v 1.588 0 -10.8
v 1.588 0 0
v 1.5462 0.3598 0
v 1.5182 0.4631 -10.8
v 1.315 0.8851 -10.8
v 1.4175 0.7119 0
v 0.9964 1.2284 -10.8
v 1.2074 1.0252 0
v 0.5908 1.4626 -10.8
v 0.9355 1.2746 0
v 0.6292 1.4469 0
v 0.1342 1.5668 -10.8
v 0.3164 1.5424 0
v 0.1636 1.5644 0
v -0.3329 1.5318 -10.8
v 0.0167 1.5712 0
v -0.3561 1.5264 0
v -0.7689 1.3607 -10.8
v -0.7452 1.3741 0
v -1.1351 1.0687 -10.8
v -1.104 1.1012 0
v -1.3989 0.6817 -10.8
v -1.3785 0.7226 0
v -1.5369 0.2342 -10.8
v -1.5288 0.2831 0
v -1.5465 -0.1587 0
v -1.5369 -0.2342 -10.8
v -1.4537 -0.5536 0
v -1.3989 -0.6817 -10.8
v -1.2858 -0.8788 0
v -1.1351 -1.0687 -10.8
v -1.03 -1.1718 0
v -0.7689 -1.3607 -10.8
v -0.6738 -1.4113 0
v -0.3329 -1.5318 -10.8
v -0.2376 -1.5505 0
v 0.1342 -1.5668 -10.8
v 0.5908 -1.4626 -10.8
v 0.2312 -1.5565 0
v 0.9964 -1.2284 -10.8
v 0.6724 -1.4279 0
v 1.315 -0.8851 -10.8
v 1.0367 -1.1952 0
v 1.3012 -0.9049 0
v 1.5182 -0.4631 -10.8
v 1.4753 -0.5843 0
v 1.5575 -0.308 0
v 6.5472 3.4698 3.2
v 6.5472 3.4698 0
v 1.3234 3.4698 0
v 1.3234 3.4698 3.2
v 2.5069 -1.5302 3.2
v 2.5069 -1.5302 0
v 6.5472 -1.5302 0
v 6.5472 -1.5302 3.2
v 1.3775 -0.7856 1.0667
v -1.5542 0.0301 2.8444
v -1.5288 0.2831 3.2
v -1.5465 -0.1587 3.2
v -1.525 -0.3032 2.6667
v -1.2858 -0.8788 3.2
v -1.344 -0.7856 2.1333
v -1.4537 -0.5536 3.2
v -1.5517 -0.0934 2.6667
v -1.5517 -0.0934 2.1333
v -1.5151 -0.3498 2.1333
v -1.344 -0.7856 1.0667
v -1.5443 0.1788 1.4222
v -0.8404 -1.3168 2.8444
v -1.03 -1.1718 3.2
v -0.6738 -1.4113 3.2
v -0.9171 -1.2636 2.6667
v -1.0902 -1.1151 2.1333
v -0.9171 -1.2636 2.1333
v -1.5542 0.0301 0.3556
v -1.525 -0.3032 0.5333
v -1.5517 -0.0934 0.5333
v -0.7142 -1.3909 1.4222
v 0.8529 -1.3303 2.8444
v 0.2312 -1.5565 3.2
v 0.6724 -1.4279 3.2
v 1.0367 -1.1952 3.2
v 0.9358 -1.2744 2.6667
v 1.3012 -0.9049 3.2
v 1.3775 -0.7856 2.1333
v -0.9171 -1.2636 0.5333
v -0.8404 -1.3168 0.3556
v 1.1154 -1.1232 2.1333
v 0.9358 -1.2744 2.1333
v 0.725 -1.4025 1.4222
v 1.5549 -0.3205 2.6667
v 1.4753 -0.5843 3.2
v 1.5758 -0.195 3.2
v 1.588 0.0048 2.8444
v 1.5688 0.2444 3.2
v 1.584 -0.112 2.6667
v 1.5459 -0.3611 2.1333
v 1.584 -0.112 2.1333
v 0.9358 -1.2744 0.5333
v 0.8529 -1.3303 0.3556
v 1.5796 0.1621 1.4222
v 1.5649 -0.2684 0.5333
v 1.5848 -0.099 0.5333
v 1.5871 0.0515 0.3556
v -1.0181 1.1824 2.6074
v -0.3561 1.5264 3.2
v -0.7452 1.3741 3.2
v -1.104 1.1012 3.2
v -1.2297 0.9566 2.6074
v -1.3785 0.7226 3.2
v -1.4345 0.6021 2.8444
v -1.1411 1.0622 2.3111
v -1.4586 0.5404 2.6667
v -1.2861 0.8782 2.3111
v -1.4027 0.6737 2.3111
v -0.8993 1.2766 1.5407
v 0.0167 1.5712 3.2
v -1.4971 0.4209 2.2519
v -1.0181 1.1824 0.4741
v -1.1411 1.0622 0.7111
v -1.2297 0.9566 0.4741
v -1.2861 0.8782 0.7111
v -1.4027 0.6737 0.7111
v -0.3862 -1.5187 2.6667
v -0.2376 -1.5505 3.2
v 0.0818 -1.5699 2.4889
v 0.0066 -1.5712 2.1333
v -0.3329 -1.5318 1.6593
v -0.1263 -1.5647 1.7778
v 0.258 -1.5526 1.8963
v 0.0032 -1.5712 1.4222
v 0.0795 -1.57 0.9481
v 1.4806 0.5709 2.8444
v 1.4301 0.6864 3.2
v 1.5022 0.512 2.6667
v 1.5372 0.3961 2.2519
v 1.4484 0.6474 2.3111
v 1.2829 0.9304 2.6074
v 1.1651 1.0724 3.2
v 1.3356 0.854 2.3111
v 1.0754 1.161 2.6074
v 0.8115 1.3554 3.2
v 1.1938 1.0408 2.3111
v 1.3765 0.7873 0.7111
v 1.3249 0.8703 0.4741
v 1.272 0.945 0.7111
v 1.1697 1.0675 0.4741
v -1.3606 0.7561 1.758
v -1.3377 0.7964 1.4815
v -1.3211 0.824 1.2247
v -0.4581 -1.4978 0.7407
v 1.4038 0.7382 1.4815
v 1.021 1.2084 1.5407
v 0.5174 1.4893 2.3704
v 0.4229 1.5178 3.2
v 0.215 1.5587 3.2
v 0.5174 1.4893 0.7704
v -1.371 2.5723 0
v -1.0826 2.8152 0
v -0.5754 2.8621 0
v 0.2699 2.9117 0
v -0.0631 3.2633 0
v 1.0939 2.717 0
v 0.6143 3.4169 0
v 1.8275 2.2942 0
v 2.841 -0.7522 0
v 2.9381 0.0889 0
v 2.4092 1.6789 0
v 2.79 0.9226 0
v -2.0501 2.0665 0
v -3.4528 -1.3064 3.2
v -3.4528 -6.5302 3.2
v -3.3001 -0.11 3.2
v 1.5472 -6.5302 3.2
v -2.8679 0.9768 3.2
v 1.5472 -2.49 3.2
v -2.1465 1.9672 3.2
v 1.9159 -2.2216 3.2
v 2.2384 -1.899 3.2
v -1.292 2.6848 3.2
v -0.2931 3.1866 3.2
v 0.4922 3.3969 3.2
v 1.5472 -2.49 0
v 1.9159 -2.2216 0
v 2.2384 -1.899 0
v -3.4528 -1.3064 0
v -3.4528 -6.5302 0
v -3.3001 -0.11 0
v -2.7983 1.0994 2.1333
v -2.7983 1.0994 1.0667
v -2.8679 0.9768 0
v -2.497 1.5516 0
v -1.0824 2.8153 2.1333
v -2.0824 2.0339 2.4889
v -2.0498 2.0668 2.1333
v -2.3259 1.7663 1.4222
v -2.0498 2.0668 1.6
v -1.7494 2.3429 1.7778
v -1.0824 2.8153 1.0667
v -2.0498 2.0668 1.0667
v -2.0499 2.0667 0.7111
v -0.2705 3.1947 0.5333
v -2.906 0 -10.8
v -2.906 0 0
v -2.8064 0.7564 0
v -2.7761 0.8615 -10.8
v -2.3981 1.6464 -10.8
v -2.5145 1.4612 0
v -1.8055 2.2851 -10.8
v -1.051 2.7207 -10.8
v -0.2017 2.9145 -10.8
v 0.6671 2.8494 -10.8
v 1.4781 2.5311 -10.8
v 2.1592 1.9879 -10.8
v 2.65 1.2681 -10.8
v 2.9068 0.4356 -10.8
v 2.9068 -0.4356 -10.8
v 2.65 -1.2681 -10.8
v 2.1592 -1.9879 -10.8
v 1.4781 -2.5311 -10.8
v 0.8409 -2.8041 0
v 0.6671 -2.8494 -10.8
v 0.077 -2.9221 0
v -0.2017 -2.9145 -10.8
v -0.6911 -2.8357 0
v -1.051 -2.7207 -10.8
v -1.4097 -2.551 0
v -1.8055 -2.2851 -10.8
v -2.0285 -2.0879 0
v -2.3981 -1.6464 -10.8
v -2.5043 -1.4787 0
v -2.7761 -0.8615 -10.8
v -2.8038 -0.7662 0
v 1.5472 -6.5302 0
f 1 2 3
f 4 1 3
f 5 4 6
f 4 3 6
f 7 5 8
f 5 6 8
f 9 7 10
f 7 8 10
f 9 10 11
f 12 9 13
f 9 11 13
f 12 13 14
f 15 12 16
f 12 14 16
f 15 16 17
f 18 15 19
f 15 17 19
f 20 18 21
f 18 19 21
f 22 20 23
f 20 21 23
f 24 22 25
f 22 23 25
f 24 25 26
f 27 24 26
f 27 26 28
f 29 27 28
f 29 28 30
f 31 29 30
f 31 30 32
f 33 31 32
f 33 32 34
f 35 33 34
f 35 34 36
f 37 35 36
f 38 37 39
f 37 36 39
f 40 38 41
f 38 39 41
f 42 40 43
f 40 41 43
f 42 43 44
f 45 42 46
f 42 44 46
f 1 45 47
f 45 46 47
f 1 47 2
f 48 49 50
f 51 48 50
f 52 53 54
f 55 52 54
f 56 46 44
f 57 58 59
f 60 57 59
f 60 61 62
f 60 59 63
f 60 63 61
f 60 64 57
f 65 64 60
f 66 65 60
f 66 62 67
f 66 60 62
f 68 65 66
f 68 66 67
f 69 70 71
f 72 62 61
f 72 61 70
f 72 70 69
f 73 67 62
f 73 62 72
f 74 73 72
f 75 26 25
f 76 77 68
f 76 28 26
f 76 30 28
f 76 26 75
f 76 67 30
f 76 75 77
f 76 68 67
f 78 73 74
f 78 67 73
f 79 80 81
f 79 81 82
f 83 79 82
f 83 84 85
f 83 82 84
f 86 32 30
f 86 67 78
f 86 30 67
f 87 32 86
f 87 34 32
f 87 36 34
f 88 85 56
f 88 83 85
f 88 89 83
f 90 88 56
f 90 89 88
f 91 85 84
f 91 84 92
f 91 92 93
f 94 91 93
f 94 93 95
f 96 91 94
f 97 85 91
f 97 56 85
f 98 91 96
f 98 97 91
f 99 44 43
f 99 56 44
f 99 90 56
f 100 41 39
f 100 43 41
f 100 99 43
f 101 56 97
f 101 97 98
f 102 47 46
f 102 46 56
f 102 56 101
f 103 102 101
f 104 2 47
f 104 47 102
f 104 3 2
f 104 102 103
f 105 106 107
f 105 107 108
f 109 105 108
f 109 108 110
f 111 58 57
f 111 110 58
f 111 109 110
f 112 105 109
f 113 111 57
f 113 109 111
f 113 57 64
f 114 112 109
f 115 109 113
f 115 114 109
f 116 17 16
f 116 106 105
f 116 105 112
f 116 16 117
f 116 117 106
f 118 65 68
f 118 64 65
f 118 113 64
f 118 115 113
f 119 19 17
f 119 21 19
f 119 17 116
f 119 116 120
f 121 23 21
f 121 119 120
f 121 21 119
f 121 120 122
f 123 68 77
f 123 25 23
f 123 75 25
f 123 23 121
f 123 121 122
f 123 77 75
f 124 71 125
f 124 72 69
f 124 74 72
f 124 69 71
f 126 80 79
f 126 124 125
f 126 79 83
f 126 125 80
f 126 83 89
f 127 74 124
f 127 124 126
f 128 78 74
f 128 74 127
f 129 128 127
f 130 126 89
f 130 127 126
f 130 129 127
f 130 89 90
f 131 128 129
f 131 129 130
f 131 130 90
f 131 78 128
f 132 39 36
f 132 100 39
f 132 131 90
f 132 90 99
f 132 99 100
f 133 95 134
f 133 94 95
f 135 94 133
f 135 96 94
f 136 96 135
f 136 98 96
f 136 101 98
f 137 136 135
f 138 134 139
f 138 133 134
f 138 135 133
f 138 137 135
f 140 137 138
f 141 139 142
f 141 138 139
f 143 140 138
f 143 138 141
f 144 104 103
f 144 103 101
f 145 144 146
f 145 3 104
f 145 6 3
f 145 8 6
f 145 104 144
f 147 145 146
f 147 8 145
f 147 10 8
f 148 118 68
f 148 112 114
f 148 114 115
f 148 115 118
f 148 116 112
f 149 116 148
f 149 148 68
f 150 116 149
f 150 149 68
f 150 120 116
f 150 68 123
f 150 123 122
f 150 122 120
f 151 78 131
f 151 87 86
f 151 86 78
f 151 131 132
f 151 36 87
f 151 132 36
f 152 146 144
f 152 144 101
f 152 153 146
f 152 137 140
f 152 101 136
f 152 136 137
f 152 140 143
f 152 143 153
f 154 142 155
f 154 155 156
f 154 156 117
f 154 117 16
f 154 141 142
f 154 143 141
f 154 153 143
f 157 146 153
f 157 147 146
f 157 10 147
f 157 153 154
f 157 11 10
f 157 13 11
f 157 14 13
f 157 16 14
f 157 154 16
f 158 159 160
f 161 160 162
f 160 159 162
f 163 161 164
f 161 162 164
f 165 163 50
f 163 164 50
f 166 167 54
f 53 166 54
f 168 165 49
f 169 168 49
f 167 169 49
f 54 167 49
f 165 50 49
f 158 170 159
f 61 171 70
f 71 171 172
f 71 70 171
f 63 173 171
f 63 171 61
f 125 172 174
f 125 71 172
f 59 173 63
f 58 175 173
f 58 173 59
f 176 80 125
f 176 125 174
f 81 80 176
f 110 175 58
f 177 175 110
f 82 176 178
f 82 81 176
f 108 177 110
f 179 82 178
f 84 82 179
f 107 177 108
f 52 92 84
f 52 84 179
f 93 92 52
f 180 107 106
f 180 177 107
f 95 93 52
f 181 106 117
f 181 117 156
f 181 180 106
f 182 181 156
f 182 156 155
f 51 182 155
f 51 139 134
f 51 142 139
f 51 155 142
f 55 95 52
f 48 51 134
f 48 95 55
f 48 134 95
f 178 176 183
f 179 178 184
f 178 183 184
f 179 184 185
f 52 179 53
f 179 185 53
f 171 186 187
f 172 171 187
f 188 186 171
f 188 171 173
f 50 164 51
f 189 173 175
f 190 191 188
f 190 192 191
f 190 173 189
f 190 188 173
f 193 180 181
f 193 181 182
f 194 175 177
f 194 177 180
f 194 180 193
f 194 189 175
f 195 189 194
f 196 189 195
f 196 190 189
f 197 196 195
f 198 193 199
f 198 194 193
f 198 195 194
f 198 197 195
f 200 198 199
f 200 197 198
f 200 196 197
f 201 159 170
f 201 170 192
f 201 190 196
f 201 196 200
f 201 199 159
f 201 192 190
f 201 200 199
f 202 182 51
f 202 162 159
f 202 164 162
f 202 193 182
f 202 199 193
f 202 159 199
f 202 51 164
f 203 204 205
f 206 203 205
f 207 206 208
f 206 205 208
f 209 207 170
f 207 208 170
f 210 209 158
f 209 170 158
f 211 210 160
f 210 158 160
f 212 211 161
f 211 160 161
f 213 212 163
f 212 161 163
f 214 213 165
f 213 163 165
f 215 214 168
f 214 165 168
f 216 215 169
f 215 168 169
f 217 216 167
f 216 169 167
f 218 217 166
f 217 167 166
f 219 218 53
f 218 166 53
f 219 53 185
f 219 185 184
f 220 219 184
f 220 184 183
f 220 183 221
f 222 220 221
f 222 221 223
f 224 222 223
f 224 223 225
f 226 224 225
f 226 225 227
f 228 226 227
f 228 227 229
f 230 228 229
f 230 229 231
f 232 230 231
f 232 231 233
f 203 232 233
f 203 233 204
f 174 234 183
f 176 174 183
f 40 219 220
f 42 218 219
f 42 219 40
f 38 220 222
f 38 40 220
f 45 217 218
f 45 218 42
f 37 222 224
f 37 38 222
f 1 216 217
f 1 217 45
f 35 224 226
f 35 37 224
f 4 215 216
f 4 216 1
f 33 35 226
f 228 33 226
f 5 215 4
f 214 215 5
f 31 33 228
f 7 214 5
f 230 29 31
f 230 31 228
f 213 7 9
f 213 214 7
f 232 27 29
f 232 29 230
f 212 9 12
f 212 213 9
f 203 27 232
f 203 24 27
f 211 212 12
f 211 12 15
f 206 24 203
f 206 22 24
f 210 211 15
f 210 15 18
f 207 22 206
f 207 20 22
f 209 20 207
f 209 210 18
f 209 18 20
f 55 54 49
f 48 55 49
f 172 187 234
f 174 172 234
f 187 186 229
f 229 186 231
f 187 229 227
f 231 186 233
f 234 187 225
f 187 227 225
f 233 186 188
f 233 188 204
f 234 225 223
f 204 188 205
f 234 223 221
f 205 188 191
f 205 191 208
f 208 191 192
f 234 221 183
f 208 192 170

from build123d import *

# Parameters (mm, degrees)
SALIENTE_EXTRUIR1_DEPTH = 3.2
CROQUIS2_R              = 2.9227085
SALIENTE_EXTRUIR2_DEPTH = 10.8
CROQUIS3_R              = 1.571228252
CORTAR_EXTRUIR1_DEPTH   = 13.8
CORTAR_EXTRUIR2_DEPTH   = 13.8


with BuildPart() as part:
    # Model → Saliente-Extruir1 (new body)
    with BuildSketch(Plane.XY):
        with BuildLine():
            Line((-3.452848132, -1.30644903), (-3.452848132, -6.530212538))
            Line((-3.452848132, -6.530212538), (6.547151868, -6.530212538))
            Line((6.547151868, -6.530212538), (6.547151868, 3.469787462))
            Line((6.547151868, 3.469787462), (1.32338836, 3.469787462))
            add(Edge.make_bspline(
                [(-3.452848132, -1.30644903), (-3.452848132, 1.32052565), (-1.303487189, 3.469787462), (1.32338836, 3.469787462)],
                knots=[0.777777778, 0.777777778, 0.777777778, 0.777777778, 1, 1, 1, 1], degree=3))
        make_face()
        with BuildLine():
            add(Edge.make_bspline(
                [(0.016741068, 1.571228252), (-2.704706095, 1.571228252), (-1.343982514, -0.785614126), (0.016741068, -3.142456504), (1.377464649, -0.785614126), (2.73818823, 1.571228252), (0.016741068, 1.571228252)],
                knots=[0, 0, 0, 2.094395102, 2.094395102, 4.188790205, 4.188790205, 6.283185307, 6.283185307, 6.283185307], degree=2, weights=[1, 0.5, 1, 0.5, 1, 0.5, 1]))
        make_face(mode=Mode.SUBTRACT)
    extrude(amount=SALIENTE_EXTRUIR1_DEPTH)

    # Croquis2 → Saliente-Extruir2 (add)
    with BuildSketch(Plane(origin=(0, 0, 0), x_dir=(-1, 0, 0), z_dir=(0, 0, -1))):
        with Locations((-0.016741068, 0)):
            Circle(CROQUIS2_R)
    extrude(amount=SALIENTE_EXTRUIR2_DEPTH)

    # Croquis3 → Cortar-Extruir1 (cut)
    with BuildSketch(Plane.XY):
        with Locations((0.016741068, 0)):
            Circle(CROQUIS3_R)
    extrude(amount=-CORTAR_EXTRUIR1_DEPTH, mode=Mode.SUBTRACT)

    # Croquis4 → Cortar-Extruir2 (cut)
    with BuildSketch(Plane(origin=(0, 0, 0), x_dir=(-1, 0, 0), z_dir=(0, 0, -1))):
        with BuildLine():
            Line((-13.440411088, -13.370534454), (-1.547151868, -13.370534454))
            Line((-1.547151868, -13.370534454), (-1.547151868, -2.489993526))
            ThreePointArc((-1.547151868, -2.489993526), (-2.083490341, -2.066584722), (-2.506856439, -1.530212538))
            Line((-2.506856439, -1.530212538), (-13.440411088, -1.530212538))
            Line((-13.440411088, -1.530212538), (-13.440411088, -13.370534454))
        make_face()
    extrude(amount=-CORTAR_EXTRUIR2_DEPTH, mode=Mode.SUBTRACT)


solid = part.part
